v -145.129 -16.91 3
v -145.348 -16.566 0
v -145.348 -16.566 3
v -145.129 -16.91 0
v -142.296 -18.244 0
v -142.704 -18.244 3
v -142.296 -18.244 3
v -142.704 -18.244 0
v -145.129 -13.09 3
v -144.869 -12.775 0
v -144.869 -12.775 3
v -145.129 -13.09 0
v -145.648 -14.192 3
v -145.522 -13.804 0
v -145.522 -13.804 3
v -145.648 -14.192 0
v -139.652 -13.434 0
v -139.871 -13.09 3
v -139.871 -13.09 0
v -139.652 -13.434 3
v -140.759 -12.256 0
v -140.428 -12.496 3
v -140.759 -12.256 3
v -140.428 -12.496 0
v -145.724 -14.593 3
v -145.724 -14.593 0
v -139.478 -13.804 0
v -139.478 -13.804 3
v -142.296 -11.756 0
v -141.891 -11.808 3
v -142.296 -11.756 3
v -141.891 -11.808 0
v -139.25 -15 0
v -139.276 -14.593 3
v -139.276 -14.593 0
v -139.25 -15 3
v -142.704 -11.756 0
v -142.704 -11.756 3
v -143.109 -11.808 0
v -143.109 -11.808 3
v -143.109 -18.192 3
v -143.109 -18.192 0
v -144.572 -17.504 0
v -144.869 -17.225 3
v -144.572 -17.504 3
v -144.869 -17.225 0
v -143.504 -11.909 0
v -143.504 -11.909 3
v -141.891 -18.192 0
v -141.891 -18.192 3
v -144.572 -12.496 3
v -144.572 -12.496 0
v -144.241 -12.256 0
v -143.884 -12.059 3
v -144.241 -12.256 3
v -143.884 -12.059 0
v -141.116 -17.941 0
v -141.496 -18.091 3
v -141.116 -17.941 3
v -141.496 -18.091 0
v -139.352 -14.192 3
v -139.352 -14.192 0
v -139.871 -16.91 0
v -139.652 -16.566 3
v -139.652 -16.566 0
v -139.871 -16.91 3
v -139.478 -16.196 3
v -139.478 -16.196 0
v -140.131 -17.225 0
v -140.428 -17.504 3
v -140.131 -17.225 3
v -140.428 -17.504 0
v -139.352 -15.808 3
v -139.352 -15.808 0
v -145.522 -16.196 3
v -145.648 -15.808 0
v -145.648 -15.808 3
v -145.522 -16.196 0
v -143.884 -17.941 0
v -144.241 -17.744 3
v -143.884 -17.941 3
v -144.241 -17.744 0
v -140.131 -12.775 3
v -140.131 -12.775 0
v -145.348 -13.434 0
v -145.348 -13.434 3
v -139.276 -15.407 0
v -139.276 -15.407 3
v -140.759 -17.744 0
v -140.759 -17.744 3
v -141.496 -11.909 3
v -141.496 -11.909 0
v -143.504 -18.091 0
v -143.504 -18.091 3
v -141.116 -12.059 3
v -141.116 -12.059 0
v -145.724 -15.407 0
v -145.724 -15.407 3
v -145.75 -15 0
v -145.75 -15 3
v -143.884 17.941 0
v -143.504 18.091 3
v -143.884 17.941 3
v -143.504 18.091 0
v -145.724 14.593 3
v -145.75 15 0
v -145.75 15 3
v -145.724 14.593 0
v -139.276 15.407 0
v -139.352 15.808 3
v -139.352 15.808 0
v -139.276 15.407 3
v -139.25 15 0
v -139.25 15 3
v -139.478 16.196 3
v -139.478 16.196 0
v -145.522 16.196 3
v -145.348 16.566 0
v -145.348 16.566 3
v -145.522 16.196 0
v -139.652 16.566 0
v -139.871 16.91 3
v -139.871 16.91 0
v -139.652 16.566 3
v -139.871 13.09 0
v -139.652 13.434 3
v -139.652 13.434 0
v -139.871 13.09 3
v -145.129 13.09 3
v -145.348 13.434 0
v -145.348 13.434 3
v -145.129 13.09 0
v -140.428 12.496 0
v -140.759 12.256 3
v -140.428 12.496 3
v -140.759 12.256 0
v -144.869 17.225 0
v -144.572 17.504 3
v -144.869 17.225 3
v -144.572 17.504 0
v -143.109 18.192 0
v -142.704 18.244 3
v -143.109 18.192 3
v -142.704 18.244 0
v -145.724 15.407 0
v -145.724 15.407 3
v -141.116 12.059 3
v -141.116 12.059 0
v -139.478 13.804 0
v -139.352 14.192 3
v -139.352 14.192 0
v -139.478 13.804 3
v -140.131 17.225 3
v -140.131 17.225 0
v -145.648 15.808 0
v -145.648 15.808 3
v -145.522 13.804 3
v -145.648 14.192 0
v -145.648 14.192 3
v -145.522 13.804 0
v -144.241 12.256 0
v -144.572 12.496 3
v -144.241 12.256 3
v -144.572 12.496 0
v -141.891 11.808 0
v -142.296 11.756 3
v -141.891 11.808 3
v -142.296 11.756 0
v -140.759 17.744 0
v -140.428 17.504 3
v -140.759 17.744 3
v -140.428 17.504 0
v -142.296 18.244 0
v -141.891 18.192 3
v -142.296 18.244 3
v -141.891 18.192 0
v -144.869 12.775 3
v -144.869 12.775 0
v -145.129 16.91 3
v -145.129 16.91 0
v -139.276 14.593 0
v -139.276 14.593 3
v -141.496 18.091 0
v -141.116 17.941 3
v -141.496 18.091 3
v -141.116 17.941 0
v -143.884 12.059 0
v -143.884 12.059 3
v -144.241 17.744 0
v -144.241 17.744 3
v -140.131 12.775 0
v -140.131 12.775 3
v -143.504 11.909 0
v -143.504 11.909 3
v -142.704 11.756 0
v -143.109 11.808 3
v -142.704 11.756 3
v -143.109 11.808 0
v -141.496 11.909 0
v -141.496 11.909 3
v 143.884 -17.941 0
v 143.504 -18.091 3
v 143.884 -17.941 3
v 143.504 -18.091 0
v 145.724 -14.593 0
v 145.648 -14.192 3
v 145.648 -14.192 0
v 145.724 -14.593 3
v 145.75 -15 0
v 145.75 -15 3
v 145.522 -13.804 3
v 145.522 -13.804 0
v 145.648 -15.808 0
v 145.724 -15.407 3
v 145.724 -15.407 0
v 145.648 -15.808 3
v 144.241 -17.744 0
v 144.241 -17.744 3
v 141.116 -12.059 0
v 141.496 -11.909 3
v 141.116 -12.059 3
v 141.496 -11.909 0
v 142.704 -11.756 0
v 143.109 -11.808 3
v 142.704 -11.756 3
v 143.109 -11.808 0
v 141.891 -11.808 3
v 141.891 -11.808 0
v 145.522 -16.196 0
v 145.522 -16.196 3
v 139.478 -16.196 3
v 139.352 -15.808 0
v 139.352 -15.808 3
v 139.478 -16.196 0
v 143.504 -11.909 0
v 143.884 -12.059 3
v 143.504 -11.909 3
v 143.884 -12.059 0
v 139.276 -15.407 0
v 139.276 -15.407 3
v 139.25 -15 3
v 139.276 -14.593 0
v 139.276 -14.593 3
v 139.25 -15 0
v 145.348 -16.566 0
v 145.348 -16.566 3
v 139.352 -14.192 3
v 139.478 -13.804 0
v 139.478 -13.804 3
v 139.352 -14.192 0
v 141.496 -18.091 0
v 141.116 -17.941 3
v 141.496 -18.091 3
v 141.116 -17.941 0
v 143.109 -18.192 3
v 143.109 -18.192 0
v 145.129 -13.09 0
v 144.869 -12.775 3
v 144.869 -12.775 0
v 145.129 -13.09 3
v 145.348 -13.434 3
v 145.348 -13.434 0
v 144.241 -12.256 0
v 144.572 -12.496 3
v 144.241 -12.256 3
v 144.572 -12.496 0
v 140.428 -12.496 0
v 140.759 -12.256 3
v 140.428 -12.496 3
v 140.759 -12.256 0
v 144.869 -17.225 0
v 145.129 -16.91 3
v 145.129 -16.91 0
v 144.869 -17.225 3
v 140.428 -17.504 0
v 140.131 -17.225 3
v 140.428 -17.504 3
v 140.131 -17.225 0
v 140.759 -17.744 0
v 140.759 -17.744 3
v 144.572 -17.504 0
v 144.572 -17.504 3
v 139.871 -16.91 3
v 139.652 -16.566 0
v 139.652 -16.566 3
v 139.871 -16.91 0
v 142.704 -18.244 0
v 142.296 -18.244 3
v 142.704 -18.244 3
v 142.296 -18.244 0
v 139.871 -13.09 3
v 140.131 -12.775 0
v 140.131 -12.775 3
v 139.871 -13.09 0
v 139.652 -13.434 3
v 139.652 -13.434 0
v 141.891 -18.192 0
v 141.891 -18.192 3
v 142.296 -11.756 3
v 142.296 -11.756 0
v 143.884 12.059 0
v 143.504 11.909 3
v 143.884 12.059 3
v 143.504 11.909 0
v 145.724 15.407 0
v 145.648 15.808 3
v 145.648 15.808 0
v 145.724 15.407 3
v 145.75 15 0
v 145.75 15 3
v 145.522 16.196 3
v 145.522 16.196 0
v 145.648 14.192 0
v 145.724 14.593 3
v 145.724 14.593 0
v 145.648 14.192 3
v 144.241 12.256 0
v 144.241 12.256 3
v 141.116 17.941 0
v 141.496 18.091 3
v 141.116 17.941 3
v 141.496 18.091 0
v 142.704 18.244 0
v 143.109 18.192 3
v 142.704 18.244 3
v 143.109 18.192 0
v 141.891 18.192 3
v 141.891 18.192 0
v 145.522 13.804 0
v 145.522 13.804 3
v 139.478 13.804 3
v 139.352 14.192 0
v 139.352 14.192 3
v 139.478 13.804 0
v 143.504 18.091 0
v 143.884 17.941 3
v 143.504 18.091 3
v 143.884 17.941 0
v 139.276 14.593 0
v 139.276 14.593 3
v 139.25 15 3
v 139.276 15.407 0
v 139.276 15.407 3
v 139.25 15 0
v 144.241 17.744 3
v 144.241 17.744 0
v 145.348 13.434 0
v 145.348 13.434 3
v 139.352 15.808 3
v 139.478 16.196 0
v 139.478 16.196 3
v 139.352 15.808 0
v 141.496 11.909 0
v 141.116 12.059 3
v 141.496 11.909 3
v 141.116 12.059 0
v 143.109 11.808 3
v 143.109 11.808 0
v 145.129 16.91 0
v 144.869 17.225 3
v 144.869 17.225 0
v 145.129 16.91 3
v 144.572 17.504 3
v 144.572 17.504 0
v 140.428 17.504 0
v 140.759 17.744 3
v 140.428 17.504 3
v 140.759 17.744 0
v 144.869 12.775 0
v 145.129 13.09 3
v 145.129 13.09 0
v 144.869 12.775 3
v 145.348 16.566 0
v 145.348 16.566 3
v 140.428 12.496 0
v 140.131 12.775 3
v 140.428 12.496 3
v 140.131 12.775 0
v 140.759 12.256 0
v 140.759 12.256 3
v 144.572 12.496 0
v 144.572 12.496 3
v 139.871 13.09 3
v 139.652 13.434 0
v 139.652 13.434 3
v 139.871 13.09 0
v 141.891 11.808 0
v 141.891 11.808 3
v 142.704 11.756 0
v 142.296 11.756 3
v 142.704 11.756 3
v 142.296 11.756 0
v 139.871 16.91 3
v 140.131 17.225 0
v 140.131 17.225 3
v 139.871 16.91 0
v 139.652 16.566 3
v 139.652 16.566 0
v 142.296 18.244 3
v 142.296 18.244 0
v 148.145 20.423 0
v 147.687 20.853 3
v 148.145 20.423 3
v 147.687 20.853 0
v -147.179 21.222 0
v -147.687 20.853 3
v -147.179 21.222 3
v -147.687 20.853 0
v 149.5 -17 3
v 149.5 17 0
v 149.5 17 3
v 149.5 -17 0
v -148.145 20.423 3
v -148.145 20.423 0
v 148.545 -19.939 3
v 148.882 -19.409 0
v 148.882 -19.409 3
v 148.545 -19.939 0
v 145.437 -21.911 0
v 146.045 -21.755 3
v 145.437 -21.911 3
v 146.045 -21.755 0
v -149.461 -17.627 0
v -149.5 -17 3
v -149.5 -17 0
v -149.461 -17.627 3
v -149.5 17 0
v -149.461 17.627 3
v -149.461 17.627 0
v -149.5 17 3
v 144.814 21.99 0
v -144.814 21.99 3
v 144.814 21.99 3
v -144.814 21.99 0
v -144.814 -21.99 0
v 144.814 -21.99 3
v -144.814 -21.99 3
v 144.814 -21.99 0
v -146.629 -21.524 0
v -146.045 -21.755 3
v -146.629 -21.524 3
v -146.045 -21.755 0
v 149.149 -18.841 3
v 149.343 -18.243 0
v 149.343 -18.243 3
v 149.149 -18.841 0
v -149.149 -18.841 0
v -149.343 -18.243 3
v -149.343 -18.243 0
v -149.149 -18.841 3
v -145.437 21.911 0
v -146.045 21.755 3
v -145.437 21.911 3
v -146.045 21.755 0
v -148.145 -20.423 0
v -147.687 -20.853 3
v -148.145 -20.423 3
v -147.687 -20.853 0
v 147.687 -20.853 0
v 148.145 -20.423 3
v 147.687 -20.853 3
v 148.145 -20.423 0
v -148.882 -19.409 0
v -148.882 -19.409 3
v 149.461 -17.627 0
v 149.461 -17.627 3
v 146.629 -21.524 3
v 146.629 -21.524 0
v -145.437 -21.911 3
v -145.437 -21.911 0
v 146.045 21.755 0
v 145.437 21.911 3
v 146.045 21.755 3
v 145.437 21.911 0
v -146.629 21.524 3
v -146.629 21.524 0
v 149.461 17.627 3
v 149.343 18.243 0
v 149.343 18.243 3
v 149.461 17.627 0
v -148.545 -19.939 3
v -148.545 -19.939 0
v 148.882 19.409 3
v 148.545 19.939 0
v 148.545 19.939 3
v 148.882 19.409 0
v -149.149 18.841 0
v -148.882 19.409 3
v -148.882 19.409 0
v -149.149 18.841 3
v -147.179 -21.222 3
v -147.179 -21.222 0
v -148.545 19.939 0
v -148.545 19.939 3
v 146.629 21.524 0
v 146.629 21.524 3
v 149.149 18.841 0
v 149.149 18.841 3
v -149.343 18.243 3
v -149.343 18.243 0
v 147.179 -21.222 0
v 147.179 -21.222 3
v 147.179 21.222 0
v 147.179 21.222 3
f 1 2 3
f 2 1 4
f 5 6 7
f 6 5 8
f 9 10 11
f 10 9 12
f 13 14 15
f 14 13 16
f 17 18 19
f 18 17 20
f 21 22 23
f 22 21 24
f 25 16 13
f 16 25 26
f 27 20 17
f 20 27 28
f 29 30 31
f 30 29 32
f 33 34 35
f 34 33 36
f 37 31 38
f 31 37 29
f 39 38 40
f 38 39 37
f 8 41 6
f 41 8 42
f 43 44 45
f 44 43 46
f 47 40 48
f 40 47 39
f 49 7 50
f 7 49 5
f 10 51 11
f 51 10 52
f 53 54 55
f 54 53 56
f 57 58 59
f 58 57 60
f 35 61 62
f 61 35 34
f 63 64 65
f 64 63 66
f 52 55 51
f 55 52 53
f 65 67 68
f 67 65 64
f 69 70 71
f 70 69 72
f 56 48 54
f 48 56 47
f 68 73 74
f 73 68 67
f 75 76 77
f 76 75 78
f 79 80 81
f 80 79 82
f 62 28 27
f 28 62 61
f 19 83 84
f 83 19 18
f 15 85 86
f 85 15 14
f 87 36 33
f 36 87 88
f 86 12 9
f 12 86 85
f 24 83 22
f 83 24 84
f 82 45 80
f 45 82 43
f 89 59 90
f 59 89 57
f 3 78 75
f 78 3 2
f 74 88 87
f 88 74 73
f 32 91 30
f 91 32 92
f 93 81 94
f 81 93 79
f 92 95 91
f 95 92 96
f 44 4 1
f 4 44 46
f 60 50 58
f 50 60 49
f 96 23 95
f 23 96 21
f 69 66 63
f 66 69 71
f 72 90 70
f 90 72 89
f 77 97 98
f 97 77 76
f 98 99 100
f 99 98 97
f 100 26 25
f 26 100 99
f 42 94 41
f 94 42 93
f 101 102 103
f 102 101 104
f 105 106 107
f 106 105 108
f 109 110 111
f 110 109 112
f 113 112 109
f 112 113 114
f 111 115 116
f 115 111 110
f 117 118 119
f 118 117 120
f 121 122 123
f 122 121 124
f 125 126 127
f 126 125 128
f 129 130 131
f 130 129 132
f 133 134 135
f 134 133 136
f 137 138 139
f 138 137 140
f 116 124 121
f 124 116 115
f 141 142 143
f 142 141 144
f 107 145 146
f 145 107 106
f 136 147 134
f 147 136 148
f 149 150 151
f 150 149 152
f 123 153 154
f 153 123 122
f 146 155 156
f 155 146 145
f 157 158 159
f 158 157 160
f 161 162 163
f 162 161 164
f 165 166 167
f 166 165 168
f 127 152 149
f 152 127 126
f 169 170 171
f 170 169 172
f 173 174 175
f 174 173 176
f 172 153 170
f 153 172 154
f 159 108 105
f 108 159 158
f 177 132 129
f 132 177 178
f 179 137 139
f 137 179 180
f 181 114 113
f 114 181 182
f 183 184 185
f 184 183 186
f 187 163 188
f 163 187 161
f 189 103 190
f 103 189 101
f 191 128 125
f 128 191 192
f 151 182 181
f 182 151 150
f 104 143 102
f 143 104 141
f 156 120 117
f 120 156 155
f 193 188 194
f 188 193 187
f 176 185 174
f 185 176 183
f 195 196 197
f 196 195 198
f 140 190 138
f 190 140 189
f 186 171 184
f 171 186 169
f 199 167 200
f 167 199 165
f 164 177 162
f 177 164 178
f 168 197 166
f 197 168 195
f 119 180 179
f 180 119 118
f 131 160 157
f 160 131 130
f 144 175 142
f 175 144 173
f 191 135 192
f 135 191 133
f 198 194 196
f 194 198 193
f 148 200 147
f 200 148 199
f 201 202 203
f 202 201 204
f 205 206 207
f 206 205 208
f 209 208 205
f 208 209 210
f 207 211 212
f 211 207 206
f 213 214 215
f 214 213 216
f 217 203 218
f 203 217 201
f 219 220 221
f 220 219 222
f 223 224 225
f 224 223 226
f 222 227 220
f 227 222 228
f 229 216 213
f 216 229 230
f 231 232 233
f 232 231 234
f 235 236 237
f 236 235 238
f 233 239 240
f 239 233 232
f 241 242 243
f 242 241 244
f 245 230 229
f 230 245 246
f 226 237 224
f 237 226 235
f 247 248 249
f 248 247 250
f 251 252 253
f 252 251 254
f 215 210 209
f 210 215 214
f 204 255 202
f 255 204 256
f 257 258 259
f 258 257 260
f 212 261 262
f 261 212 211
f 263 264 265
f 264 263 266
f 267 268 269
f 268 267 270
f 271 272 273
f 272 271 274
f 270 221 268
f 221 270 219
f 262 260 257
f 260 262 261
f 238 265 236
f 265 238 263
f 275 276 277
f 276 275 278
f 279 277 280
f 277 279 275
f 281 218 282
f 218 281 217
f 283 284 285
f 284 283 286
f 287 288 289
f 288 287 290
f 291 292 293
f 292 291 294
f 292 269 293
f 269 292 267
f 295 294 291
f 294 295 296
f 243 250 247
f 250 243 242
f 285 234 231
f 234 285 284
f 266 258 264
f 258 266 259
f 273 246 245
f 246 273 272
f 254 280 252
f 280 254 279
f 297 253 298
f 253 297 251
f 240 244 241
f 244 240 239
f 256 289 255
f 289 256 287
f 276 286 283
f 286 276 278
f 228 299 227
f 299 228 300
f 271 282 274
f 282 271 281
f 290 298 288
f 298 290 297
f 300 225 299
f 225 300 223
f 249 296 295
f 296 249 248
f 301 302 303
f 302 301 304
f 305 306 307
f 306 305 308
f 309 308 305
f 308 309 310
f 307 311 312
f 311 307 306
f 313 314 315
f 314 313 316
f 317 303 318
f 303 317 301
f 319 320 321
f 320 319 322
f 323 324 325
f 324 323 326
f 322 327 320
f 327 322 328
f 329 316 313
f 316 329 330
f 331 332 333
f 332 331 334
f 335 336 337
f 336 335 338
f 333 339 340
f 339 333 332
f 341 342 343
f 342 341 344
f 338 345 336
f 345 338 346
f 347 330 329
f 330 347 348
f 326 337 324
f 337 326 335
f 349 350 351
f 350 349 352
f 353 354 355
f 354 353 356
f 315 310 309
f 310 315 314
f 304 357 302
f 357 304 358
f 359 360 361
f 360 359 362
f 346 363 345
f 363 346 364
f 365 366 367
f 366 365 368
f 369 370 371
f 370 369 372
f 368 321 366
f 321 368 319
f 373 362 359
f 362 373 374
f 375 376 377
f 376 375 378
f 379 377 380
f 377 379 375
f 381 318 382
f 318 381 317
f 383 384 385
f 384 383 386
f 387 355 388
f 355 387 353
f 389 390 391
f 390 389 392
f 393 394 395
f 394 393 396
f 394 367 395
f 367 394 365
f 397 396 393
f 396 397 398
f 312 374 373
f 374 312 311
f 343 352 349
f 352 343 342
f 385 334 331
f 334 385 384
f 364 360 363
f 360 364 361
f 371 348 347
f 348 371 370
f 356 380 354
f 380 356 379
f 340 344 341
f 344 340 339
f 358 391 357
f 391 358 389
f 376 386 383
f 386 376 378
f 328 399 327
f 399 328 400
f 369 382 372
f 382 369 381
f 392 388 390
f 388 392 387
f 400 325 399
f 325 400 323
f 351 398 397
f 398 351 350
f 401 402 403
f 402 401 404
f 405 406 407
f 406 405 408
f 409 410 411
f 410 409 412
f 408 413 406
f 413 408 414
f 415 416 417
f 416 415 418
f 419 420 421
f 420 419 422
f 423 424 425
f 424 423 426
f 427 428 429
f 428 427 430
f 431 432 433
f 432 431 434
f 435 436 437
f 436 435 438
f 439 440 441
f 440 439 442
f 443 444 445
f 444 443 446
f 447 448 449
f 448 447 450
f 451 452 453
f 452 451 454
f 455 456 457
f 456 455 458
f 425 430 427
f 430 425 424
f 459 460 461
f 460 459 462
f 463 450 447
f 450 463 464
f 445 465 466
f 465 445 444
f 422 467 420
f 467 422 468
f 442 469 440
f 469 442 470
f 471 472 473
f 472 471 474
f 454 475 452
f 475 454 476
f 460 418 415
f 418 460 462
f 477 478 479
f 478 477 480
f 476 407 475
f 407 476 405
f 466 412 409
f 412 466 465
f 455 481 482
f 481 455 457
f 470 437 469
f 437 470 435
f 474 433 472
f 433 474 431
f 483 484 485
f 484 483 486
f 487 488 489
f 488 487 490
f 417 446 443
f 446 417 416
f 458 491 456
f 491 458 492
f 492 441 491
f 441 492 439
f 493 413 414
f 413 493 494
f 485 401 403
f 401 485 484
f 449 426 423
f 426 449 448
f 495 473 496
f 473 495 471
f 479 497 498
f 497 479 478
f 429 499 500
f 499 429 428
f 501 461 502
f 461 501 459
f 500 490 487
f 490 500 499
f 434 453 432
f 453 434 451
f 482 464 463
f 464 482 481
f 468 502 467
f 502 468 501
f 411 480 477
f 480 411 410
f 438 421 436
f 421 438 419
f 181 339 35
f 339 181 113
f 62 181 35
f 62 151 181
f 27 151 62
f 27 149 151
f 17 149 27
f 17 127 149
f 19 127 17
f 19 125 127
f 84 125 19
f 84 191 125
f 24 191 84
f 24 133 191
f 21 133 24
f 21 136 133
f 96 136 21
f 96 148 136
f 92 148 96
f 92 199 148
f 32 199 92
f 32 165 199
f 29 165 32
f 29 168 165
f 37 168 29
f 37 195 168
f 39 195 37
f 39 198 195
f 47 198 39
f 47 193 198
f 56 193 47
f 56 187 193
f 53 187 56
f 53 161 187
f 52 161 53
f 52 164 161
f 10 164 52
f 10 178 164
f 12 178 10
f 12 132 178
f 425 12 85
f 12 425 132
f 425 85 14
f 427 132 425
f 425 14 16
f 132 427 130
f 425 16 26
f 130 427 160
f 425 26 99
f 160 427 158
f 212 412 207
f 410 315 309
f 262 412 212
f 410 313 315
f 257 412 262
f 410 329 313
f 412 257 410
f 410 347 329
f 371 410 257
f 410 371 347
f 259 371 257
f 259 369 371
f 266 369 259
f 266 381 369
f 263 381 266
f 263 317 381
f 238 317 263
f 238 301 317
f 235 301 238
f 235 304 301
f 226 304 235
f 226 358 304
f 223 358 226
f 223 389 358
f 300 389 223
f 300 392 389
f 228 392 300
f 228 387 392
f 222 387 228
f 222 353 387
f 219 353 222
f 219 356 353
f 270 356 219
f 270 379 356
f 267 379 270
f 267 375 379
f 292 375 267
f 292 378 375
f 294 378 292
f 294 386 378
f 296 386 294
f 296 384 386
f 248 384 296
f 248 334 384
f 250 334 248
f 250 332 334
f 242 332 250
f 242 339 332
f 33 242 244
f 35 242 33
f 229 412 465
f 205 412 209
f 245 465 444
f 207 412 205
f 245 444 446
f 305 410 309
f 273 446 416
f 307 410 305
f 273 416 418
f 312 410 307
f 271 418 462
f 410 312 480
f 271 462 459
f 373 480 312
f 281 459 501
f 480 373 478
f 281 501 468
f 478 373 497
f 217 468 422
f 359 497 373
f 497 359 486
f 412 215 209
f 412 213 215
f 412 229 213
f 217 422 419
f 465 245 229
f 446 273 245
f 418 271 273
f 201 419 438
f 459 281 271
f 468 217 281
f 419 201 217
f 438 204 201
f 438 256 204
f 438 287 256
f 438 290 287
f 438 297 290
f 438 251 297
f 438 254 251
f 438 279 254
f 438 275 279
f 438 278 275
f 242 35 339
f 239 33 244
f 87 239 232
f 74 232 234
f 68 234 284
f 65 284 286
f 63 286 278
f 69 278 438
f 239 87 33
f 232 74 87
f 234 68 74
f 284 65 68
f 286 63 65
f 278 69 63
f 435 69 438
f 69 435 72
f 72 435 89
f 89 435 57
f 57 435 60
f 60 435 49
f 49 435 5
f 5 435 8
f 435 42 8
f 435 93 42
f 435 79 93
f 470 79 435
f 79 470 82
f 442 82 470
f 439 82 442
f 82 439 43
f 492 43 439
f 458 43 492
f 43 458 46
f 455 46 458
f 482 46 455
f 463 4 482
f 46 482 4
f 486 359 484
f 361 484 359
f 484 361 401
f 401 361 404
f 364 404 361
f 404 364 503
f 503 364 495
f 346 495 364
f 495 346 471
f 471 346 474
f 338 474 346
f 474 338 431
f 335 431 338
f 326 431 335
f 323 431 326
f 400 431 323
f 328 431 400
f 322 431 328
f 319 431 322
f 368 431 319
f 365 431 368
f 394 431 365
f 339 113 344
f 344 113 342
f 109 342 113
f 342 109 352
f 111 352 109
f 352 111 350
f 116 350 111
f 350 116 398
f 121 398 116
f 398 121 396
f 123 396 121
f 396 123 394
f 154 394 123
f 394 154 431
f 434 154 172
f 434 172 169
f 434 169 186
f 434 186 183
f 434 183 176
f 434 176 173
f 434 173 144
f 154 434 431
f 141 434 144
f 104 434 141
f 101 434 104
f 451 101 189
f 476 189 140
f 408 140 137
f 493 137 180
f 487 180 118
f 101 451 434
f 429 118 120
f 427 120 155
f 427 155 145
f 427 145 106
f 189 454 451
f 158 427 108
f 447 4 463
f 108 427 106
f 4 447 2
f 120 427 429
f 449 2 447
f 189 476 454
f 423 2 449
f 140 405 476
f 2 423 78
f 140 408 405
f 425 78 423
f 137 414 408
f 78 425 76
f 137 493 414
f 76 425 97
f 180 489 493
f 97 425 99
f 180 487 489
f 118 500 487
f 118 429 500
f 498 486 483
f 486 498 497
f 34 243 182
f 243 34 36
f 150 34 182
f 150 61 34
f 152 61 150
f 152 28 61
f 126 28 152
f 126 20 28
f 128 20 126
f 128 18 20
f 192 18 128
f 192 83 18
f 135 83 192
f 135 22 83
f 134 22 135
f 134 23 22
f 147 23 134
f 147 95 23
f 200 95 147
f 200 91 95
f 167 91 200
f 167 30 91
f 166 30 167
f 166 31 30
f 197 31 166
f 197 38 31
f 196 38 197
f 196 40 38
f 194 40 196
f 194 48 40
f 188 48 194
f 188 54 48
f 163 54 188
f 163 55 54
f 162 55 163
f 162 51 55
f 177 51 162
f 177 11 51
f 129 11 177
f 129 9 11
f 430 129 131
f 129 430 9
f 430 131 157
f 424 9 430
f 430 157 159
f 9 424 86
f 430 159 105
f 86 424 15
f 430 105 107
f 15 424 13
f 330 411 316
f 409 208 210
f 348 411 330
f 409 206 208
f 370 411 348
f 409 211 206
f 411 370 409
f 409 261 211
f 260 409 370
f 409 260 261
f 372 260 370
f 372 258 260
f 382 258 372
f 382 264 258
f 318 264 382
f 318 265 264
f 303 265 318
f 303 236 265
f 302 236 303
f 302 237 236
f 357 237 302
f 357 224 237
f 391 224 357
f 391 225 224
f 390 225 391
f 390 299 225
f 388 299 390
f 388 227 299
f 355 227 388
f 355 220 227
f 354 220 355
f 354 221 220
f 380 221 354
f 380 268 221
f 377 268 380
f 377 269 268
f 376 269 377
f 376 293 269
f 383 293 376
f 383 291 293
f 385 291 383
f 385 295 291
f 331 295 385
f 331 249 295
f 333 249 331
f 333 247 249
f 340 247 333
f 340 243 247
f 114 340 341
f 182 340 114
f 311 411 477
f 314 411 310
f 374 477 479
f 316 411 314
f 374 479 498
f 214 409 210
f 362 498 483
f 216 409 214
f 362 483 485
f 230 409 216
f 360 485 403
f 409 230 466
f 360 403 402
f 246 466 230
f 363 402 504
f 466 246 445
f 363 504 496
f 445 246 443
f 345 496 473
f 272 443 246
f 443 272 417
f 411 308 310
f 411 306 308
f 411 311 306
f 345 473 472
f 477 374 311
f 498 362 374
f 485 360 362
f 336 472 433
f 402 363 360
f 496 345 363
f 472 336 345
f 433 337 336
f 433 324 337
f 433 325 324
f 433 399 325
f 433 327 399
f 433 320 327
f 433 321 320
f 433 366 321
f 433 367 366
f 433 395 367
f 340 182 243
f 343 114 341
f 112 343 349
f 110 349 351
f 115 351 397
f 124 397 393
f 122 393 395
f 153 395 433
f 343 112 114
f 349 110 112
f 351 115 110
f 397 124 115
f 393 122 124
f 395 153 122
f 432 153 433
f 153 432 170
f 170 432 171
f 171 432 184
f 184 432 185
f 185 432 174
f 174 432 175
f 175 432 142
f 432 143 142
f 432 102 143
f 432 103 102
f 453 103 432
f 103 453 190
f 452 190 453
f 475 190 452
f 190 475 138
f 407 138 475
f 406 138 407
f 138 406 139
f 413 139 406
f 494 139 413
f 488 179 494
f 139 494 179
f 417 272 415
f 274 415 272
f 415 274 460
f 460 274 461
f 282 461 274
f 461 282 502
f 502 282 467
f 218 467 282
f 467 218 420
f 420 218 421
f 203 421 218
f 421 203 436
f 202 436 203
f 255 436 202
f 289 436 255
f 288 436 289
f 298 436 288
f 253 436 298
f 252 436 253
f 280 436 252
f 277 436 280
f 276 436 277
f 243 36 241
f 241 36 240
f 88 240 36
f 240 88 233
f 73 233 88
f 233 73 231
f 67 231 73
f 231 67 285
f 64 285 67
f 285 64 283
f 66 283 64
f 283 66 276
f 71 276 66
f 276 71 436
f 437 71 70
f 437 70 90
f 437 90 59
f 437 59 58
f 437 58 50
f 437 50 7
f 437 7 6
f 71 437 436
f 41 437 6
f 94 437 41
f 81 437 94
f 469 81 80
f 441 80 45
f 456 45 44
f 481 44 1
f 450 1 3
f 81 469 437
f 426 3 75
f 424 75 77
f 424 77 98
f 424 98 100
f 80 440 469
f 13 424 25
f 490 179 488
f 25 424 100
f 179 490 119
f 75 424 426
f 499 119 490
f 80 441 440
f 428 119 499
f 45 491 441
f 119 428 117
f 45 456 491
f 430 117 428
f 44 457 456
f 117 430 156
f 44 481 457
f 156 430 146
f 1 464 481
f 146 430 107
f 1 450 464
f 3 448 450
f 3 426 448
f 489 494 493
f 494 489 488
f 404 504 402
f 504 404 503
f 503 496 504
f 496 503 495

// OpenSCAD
$fn = 50;


difference() {
	union() {
		hull() {
			translate(v = [-144.5000000000, 17.0000000000, 0]) {
				cylinder(h = 3, r = 5);
			}
			translate(v = [144.5000000000, 17.0000000000, 0]) {
				cylinder(h = 3, r = 5);
			}
			translate(v = [-144.5000000000, -17.0000000000, 0]) {
				cylinder(h = 3, r = 5);
			}
			translate(v = [144.5000000000, -17.0000000000, 0]) {
				cylinder(h = 3, r = 5);
			}
		}
	}
	union() {
		translate(v = [-142.5000000000, -15.0000000000, -100.0000000000]) {
			cylinder(h = 200, r = 3.2500000000);
		}
		translate(v = [-142.5000000000, 15.0000000000, -100.0000000000]) {
			cylinder(h = 200, r = 3.2500000000);
		}
		translate(v = [142.5000000000, -15.0000000000, -100.0000000000]) {
			cylinder(h = 200, r = 3.2500000000);
		}
		translate(v = [142.5000000000, 15.0000000000, -100.0000000000]) {
			cylinder(h = 200, r = 3.2500000000);
		}
	}
}
